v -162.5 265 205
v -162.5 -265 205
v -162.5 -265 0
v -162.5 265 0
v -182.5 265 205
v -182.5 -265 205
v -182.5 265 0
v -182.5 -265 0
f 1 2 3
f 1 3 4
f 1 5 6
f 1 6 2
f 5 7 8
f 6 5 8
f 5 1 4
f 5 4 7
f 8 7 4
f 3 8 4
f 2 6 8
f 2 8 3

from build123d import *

# Parameters (mm, degrees)
F0_W     = 365
F0_H     = 530
F1_DEPTH = 10
F2_W     = 325
F2_H     = 20
F3_DEPTH = 195
F4_W     = 345
F4_H     = 530
F5_DEPTH = 205.001


with BuildPart() as f1:
    # F0 (on Top) → F1 (new body)
    with BuildSketch(Plane.XY):
        Rectangle(F0_W, F0_H)
    extrude(amount=F1_DEPTH)

    # F2 (on face) → F3 (join)
    with BuildSketch(Plane.XY.offset(10)):
        Polygon((-162.5, 265), (-182.5, 265), (-182.5, -265), (-162.5, -265), (-162.5, -245), (-162.5, 245), align=None)
        with Locations((0, 255)):
            Rectangle(F2_W, F2_H)
        Polygon((182.5, 265), (162.5, 265), (162.5, 245), (162.5, -245), (162.5, -265), (182.5, -265), align=None)
        with Locations((0, -255)):
            Rectangle(F2_W, F2_H)
    extrude(amount=F3_DEPTH)

    # F4 (on face) → F5 (cut, through all)
    with BuildSketch(Plane.XY.offset(205)):
        with Locations((10, 0)):
            Rectangle(F4_W, F4_H)
    extrude(amount=-F5_DEPTH, mode=Mode.SUBTRACT)


solid = f1.part
